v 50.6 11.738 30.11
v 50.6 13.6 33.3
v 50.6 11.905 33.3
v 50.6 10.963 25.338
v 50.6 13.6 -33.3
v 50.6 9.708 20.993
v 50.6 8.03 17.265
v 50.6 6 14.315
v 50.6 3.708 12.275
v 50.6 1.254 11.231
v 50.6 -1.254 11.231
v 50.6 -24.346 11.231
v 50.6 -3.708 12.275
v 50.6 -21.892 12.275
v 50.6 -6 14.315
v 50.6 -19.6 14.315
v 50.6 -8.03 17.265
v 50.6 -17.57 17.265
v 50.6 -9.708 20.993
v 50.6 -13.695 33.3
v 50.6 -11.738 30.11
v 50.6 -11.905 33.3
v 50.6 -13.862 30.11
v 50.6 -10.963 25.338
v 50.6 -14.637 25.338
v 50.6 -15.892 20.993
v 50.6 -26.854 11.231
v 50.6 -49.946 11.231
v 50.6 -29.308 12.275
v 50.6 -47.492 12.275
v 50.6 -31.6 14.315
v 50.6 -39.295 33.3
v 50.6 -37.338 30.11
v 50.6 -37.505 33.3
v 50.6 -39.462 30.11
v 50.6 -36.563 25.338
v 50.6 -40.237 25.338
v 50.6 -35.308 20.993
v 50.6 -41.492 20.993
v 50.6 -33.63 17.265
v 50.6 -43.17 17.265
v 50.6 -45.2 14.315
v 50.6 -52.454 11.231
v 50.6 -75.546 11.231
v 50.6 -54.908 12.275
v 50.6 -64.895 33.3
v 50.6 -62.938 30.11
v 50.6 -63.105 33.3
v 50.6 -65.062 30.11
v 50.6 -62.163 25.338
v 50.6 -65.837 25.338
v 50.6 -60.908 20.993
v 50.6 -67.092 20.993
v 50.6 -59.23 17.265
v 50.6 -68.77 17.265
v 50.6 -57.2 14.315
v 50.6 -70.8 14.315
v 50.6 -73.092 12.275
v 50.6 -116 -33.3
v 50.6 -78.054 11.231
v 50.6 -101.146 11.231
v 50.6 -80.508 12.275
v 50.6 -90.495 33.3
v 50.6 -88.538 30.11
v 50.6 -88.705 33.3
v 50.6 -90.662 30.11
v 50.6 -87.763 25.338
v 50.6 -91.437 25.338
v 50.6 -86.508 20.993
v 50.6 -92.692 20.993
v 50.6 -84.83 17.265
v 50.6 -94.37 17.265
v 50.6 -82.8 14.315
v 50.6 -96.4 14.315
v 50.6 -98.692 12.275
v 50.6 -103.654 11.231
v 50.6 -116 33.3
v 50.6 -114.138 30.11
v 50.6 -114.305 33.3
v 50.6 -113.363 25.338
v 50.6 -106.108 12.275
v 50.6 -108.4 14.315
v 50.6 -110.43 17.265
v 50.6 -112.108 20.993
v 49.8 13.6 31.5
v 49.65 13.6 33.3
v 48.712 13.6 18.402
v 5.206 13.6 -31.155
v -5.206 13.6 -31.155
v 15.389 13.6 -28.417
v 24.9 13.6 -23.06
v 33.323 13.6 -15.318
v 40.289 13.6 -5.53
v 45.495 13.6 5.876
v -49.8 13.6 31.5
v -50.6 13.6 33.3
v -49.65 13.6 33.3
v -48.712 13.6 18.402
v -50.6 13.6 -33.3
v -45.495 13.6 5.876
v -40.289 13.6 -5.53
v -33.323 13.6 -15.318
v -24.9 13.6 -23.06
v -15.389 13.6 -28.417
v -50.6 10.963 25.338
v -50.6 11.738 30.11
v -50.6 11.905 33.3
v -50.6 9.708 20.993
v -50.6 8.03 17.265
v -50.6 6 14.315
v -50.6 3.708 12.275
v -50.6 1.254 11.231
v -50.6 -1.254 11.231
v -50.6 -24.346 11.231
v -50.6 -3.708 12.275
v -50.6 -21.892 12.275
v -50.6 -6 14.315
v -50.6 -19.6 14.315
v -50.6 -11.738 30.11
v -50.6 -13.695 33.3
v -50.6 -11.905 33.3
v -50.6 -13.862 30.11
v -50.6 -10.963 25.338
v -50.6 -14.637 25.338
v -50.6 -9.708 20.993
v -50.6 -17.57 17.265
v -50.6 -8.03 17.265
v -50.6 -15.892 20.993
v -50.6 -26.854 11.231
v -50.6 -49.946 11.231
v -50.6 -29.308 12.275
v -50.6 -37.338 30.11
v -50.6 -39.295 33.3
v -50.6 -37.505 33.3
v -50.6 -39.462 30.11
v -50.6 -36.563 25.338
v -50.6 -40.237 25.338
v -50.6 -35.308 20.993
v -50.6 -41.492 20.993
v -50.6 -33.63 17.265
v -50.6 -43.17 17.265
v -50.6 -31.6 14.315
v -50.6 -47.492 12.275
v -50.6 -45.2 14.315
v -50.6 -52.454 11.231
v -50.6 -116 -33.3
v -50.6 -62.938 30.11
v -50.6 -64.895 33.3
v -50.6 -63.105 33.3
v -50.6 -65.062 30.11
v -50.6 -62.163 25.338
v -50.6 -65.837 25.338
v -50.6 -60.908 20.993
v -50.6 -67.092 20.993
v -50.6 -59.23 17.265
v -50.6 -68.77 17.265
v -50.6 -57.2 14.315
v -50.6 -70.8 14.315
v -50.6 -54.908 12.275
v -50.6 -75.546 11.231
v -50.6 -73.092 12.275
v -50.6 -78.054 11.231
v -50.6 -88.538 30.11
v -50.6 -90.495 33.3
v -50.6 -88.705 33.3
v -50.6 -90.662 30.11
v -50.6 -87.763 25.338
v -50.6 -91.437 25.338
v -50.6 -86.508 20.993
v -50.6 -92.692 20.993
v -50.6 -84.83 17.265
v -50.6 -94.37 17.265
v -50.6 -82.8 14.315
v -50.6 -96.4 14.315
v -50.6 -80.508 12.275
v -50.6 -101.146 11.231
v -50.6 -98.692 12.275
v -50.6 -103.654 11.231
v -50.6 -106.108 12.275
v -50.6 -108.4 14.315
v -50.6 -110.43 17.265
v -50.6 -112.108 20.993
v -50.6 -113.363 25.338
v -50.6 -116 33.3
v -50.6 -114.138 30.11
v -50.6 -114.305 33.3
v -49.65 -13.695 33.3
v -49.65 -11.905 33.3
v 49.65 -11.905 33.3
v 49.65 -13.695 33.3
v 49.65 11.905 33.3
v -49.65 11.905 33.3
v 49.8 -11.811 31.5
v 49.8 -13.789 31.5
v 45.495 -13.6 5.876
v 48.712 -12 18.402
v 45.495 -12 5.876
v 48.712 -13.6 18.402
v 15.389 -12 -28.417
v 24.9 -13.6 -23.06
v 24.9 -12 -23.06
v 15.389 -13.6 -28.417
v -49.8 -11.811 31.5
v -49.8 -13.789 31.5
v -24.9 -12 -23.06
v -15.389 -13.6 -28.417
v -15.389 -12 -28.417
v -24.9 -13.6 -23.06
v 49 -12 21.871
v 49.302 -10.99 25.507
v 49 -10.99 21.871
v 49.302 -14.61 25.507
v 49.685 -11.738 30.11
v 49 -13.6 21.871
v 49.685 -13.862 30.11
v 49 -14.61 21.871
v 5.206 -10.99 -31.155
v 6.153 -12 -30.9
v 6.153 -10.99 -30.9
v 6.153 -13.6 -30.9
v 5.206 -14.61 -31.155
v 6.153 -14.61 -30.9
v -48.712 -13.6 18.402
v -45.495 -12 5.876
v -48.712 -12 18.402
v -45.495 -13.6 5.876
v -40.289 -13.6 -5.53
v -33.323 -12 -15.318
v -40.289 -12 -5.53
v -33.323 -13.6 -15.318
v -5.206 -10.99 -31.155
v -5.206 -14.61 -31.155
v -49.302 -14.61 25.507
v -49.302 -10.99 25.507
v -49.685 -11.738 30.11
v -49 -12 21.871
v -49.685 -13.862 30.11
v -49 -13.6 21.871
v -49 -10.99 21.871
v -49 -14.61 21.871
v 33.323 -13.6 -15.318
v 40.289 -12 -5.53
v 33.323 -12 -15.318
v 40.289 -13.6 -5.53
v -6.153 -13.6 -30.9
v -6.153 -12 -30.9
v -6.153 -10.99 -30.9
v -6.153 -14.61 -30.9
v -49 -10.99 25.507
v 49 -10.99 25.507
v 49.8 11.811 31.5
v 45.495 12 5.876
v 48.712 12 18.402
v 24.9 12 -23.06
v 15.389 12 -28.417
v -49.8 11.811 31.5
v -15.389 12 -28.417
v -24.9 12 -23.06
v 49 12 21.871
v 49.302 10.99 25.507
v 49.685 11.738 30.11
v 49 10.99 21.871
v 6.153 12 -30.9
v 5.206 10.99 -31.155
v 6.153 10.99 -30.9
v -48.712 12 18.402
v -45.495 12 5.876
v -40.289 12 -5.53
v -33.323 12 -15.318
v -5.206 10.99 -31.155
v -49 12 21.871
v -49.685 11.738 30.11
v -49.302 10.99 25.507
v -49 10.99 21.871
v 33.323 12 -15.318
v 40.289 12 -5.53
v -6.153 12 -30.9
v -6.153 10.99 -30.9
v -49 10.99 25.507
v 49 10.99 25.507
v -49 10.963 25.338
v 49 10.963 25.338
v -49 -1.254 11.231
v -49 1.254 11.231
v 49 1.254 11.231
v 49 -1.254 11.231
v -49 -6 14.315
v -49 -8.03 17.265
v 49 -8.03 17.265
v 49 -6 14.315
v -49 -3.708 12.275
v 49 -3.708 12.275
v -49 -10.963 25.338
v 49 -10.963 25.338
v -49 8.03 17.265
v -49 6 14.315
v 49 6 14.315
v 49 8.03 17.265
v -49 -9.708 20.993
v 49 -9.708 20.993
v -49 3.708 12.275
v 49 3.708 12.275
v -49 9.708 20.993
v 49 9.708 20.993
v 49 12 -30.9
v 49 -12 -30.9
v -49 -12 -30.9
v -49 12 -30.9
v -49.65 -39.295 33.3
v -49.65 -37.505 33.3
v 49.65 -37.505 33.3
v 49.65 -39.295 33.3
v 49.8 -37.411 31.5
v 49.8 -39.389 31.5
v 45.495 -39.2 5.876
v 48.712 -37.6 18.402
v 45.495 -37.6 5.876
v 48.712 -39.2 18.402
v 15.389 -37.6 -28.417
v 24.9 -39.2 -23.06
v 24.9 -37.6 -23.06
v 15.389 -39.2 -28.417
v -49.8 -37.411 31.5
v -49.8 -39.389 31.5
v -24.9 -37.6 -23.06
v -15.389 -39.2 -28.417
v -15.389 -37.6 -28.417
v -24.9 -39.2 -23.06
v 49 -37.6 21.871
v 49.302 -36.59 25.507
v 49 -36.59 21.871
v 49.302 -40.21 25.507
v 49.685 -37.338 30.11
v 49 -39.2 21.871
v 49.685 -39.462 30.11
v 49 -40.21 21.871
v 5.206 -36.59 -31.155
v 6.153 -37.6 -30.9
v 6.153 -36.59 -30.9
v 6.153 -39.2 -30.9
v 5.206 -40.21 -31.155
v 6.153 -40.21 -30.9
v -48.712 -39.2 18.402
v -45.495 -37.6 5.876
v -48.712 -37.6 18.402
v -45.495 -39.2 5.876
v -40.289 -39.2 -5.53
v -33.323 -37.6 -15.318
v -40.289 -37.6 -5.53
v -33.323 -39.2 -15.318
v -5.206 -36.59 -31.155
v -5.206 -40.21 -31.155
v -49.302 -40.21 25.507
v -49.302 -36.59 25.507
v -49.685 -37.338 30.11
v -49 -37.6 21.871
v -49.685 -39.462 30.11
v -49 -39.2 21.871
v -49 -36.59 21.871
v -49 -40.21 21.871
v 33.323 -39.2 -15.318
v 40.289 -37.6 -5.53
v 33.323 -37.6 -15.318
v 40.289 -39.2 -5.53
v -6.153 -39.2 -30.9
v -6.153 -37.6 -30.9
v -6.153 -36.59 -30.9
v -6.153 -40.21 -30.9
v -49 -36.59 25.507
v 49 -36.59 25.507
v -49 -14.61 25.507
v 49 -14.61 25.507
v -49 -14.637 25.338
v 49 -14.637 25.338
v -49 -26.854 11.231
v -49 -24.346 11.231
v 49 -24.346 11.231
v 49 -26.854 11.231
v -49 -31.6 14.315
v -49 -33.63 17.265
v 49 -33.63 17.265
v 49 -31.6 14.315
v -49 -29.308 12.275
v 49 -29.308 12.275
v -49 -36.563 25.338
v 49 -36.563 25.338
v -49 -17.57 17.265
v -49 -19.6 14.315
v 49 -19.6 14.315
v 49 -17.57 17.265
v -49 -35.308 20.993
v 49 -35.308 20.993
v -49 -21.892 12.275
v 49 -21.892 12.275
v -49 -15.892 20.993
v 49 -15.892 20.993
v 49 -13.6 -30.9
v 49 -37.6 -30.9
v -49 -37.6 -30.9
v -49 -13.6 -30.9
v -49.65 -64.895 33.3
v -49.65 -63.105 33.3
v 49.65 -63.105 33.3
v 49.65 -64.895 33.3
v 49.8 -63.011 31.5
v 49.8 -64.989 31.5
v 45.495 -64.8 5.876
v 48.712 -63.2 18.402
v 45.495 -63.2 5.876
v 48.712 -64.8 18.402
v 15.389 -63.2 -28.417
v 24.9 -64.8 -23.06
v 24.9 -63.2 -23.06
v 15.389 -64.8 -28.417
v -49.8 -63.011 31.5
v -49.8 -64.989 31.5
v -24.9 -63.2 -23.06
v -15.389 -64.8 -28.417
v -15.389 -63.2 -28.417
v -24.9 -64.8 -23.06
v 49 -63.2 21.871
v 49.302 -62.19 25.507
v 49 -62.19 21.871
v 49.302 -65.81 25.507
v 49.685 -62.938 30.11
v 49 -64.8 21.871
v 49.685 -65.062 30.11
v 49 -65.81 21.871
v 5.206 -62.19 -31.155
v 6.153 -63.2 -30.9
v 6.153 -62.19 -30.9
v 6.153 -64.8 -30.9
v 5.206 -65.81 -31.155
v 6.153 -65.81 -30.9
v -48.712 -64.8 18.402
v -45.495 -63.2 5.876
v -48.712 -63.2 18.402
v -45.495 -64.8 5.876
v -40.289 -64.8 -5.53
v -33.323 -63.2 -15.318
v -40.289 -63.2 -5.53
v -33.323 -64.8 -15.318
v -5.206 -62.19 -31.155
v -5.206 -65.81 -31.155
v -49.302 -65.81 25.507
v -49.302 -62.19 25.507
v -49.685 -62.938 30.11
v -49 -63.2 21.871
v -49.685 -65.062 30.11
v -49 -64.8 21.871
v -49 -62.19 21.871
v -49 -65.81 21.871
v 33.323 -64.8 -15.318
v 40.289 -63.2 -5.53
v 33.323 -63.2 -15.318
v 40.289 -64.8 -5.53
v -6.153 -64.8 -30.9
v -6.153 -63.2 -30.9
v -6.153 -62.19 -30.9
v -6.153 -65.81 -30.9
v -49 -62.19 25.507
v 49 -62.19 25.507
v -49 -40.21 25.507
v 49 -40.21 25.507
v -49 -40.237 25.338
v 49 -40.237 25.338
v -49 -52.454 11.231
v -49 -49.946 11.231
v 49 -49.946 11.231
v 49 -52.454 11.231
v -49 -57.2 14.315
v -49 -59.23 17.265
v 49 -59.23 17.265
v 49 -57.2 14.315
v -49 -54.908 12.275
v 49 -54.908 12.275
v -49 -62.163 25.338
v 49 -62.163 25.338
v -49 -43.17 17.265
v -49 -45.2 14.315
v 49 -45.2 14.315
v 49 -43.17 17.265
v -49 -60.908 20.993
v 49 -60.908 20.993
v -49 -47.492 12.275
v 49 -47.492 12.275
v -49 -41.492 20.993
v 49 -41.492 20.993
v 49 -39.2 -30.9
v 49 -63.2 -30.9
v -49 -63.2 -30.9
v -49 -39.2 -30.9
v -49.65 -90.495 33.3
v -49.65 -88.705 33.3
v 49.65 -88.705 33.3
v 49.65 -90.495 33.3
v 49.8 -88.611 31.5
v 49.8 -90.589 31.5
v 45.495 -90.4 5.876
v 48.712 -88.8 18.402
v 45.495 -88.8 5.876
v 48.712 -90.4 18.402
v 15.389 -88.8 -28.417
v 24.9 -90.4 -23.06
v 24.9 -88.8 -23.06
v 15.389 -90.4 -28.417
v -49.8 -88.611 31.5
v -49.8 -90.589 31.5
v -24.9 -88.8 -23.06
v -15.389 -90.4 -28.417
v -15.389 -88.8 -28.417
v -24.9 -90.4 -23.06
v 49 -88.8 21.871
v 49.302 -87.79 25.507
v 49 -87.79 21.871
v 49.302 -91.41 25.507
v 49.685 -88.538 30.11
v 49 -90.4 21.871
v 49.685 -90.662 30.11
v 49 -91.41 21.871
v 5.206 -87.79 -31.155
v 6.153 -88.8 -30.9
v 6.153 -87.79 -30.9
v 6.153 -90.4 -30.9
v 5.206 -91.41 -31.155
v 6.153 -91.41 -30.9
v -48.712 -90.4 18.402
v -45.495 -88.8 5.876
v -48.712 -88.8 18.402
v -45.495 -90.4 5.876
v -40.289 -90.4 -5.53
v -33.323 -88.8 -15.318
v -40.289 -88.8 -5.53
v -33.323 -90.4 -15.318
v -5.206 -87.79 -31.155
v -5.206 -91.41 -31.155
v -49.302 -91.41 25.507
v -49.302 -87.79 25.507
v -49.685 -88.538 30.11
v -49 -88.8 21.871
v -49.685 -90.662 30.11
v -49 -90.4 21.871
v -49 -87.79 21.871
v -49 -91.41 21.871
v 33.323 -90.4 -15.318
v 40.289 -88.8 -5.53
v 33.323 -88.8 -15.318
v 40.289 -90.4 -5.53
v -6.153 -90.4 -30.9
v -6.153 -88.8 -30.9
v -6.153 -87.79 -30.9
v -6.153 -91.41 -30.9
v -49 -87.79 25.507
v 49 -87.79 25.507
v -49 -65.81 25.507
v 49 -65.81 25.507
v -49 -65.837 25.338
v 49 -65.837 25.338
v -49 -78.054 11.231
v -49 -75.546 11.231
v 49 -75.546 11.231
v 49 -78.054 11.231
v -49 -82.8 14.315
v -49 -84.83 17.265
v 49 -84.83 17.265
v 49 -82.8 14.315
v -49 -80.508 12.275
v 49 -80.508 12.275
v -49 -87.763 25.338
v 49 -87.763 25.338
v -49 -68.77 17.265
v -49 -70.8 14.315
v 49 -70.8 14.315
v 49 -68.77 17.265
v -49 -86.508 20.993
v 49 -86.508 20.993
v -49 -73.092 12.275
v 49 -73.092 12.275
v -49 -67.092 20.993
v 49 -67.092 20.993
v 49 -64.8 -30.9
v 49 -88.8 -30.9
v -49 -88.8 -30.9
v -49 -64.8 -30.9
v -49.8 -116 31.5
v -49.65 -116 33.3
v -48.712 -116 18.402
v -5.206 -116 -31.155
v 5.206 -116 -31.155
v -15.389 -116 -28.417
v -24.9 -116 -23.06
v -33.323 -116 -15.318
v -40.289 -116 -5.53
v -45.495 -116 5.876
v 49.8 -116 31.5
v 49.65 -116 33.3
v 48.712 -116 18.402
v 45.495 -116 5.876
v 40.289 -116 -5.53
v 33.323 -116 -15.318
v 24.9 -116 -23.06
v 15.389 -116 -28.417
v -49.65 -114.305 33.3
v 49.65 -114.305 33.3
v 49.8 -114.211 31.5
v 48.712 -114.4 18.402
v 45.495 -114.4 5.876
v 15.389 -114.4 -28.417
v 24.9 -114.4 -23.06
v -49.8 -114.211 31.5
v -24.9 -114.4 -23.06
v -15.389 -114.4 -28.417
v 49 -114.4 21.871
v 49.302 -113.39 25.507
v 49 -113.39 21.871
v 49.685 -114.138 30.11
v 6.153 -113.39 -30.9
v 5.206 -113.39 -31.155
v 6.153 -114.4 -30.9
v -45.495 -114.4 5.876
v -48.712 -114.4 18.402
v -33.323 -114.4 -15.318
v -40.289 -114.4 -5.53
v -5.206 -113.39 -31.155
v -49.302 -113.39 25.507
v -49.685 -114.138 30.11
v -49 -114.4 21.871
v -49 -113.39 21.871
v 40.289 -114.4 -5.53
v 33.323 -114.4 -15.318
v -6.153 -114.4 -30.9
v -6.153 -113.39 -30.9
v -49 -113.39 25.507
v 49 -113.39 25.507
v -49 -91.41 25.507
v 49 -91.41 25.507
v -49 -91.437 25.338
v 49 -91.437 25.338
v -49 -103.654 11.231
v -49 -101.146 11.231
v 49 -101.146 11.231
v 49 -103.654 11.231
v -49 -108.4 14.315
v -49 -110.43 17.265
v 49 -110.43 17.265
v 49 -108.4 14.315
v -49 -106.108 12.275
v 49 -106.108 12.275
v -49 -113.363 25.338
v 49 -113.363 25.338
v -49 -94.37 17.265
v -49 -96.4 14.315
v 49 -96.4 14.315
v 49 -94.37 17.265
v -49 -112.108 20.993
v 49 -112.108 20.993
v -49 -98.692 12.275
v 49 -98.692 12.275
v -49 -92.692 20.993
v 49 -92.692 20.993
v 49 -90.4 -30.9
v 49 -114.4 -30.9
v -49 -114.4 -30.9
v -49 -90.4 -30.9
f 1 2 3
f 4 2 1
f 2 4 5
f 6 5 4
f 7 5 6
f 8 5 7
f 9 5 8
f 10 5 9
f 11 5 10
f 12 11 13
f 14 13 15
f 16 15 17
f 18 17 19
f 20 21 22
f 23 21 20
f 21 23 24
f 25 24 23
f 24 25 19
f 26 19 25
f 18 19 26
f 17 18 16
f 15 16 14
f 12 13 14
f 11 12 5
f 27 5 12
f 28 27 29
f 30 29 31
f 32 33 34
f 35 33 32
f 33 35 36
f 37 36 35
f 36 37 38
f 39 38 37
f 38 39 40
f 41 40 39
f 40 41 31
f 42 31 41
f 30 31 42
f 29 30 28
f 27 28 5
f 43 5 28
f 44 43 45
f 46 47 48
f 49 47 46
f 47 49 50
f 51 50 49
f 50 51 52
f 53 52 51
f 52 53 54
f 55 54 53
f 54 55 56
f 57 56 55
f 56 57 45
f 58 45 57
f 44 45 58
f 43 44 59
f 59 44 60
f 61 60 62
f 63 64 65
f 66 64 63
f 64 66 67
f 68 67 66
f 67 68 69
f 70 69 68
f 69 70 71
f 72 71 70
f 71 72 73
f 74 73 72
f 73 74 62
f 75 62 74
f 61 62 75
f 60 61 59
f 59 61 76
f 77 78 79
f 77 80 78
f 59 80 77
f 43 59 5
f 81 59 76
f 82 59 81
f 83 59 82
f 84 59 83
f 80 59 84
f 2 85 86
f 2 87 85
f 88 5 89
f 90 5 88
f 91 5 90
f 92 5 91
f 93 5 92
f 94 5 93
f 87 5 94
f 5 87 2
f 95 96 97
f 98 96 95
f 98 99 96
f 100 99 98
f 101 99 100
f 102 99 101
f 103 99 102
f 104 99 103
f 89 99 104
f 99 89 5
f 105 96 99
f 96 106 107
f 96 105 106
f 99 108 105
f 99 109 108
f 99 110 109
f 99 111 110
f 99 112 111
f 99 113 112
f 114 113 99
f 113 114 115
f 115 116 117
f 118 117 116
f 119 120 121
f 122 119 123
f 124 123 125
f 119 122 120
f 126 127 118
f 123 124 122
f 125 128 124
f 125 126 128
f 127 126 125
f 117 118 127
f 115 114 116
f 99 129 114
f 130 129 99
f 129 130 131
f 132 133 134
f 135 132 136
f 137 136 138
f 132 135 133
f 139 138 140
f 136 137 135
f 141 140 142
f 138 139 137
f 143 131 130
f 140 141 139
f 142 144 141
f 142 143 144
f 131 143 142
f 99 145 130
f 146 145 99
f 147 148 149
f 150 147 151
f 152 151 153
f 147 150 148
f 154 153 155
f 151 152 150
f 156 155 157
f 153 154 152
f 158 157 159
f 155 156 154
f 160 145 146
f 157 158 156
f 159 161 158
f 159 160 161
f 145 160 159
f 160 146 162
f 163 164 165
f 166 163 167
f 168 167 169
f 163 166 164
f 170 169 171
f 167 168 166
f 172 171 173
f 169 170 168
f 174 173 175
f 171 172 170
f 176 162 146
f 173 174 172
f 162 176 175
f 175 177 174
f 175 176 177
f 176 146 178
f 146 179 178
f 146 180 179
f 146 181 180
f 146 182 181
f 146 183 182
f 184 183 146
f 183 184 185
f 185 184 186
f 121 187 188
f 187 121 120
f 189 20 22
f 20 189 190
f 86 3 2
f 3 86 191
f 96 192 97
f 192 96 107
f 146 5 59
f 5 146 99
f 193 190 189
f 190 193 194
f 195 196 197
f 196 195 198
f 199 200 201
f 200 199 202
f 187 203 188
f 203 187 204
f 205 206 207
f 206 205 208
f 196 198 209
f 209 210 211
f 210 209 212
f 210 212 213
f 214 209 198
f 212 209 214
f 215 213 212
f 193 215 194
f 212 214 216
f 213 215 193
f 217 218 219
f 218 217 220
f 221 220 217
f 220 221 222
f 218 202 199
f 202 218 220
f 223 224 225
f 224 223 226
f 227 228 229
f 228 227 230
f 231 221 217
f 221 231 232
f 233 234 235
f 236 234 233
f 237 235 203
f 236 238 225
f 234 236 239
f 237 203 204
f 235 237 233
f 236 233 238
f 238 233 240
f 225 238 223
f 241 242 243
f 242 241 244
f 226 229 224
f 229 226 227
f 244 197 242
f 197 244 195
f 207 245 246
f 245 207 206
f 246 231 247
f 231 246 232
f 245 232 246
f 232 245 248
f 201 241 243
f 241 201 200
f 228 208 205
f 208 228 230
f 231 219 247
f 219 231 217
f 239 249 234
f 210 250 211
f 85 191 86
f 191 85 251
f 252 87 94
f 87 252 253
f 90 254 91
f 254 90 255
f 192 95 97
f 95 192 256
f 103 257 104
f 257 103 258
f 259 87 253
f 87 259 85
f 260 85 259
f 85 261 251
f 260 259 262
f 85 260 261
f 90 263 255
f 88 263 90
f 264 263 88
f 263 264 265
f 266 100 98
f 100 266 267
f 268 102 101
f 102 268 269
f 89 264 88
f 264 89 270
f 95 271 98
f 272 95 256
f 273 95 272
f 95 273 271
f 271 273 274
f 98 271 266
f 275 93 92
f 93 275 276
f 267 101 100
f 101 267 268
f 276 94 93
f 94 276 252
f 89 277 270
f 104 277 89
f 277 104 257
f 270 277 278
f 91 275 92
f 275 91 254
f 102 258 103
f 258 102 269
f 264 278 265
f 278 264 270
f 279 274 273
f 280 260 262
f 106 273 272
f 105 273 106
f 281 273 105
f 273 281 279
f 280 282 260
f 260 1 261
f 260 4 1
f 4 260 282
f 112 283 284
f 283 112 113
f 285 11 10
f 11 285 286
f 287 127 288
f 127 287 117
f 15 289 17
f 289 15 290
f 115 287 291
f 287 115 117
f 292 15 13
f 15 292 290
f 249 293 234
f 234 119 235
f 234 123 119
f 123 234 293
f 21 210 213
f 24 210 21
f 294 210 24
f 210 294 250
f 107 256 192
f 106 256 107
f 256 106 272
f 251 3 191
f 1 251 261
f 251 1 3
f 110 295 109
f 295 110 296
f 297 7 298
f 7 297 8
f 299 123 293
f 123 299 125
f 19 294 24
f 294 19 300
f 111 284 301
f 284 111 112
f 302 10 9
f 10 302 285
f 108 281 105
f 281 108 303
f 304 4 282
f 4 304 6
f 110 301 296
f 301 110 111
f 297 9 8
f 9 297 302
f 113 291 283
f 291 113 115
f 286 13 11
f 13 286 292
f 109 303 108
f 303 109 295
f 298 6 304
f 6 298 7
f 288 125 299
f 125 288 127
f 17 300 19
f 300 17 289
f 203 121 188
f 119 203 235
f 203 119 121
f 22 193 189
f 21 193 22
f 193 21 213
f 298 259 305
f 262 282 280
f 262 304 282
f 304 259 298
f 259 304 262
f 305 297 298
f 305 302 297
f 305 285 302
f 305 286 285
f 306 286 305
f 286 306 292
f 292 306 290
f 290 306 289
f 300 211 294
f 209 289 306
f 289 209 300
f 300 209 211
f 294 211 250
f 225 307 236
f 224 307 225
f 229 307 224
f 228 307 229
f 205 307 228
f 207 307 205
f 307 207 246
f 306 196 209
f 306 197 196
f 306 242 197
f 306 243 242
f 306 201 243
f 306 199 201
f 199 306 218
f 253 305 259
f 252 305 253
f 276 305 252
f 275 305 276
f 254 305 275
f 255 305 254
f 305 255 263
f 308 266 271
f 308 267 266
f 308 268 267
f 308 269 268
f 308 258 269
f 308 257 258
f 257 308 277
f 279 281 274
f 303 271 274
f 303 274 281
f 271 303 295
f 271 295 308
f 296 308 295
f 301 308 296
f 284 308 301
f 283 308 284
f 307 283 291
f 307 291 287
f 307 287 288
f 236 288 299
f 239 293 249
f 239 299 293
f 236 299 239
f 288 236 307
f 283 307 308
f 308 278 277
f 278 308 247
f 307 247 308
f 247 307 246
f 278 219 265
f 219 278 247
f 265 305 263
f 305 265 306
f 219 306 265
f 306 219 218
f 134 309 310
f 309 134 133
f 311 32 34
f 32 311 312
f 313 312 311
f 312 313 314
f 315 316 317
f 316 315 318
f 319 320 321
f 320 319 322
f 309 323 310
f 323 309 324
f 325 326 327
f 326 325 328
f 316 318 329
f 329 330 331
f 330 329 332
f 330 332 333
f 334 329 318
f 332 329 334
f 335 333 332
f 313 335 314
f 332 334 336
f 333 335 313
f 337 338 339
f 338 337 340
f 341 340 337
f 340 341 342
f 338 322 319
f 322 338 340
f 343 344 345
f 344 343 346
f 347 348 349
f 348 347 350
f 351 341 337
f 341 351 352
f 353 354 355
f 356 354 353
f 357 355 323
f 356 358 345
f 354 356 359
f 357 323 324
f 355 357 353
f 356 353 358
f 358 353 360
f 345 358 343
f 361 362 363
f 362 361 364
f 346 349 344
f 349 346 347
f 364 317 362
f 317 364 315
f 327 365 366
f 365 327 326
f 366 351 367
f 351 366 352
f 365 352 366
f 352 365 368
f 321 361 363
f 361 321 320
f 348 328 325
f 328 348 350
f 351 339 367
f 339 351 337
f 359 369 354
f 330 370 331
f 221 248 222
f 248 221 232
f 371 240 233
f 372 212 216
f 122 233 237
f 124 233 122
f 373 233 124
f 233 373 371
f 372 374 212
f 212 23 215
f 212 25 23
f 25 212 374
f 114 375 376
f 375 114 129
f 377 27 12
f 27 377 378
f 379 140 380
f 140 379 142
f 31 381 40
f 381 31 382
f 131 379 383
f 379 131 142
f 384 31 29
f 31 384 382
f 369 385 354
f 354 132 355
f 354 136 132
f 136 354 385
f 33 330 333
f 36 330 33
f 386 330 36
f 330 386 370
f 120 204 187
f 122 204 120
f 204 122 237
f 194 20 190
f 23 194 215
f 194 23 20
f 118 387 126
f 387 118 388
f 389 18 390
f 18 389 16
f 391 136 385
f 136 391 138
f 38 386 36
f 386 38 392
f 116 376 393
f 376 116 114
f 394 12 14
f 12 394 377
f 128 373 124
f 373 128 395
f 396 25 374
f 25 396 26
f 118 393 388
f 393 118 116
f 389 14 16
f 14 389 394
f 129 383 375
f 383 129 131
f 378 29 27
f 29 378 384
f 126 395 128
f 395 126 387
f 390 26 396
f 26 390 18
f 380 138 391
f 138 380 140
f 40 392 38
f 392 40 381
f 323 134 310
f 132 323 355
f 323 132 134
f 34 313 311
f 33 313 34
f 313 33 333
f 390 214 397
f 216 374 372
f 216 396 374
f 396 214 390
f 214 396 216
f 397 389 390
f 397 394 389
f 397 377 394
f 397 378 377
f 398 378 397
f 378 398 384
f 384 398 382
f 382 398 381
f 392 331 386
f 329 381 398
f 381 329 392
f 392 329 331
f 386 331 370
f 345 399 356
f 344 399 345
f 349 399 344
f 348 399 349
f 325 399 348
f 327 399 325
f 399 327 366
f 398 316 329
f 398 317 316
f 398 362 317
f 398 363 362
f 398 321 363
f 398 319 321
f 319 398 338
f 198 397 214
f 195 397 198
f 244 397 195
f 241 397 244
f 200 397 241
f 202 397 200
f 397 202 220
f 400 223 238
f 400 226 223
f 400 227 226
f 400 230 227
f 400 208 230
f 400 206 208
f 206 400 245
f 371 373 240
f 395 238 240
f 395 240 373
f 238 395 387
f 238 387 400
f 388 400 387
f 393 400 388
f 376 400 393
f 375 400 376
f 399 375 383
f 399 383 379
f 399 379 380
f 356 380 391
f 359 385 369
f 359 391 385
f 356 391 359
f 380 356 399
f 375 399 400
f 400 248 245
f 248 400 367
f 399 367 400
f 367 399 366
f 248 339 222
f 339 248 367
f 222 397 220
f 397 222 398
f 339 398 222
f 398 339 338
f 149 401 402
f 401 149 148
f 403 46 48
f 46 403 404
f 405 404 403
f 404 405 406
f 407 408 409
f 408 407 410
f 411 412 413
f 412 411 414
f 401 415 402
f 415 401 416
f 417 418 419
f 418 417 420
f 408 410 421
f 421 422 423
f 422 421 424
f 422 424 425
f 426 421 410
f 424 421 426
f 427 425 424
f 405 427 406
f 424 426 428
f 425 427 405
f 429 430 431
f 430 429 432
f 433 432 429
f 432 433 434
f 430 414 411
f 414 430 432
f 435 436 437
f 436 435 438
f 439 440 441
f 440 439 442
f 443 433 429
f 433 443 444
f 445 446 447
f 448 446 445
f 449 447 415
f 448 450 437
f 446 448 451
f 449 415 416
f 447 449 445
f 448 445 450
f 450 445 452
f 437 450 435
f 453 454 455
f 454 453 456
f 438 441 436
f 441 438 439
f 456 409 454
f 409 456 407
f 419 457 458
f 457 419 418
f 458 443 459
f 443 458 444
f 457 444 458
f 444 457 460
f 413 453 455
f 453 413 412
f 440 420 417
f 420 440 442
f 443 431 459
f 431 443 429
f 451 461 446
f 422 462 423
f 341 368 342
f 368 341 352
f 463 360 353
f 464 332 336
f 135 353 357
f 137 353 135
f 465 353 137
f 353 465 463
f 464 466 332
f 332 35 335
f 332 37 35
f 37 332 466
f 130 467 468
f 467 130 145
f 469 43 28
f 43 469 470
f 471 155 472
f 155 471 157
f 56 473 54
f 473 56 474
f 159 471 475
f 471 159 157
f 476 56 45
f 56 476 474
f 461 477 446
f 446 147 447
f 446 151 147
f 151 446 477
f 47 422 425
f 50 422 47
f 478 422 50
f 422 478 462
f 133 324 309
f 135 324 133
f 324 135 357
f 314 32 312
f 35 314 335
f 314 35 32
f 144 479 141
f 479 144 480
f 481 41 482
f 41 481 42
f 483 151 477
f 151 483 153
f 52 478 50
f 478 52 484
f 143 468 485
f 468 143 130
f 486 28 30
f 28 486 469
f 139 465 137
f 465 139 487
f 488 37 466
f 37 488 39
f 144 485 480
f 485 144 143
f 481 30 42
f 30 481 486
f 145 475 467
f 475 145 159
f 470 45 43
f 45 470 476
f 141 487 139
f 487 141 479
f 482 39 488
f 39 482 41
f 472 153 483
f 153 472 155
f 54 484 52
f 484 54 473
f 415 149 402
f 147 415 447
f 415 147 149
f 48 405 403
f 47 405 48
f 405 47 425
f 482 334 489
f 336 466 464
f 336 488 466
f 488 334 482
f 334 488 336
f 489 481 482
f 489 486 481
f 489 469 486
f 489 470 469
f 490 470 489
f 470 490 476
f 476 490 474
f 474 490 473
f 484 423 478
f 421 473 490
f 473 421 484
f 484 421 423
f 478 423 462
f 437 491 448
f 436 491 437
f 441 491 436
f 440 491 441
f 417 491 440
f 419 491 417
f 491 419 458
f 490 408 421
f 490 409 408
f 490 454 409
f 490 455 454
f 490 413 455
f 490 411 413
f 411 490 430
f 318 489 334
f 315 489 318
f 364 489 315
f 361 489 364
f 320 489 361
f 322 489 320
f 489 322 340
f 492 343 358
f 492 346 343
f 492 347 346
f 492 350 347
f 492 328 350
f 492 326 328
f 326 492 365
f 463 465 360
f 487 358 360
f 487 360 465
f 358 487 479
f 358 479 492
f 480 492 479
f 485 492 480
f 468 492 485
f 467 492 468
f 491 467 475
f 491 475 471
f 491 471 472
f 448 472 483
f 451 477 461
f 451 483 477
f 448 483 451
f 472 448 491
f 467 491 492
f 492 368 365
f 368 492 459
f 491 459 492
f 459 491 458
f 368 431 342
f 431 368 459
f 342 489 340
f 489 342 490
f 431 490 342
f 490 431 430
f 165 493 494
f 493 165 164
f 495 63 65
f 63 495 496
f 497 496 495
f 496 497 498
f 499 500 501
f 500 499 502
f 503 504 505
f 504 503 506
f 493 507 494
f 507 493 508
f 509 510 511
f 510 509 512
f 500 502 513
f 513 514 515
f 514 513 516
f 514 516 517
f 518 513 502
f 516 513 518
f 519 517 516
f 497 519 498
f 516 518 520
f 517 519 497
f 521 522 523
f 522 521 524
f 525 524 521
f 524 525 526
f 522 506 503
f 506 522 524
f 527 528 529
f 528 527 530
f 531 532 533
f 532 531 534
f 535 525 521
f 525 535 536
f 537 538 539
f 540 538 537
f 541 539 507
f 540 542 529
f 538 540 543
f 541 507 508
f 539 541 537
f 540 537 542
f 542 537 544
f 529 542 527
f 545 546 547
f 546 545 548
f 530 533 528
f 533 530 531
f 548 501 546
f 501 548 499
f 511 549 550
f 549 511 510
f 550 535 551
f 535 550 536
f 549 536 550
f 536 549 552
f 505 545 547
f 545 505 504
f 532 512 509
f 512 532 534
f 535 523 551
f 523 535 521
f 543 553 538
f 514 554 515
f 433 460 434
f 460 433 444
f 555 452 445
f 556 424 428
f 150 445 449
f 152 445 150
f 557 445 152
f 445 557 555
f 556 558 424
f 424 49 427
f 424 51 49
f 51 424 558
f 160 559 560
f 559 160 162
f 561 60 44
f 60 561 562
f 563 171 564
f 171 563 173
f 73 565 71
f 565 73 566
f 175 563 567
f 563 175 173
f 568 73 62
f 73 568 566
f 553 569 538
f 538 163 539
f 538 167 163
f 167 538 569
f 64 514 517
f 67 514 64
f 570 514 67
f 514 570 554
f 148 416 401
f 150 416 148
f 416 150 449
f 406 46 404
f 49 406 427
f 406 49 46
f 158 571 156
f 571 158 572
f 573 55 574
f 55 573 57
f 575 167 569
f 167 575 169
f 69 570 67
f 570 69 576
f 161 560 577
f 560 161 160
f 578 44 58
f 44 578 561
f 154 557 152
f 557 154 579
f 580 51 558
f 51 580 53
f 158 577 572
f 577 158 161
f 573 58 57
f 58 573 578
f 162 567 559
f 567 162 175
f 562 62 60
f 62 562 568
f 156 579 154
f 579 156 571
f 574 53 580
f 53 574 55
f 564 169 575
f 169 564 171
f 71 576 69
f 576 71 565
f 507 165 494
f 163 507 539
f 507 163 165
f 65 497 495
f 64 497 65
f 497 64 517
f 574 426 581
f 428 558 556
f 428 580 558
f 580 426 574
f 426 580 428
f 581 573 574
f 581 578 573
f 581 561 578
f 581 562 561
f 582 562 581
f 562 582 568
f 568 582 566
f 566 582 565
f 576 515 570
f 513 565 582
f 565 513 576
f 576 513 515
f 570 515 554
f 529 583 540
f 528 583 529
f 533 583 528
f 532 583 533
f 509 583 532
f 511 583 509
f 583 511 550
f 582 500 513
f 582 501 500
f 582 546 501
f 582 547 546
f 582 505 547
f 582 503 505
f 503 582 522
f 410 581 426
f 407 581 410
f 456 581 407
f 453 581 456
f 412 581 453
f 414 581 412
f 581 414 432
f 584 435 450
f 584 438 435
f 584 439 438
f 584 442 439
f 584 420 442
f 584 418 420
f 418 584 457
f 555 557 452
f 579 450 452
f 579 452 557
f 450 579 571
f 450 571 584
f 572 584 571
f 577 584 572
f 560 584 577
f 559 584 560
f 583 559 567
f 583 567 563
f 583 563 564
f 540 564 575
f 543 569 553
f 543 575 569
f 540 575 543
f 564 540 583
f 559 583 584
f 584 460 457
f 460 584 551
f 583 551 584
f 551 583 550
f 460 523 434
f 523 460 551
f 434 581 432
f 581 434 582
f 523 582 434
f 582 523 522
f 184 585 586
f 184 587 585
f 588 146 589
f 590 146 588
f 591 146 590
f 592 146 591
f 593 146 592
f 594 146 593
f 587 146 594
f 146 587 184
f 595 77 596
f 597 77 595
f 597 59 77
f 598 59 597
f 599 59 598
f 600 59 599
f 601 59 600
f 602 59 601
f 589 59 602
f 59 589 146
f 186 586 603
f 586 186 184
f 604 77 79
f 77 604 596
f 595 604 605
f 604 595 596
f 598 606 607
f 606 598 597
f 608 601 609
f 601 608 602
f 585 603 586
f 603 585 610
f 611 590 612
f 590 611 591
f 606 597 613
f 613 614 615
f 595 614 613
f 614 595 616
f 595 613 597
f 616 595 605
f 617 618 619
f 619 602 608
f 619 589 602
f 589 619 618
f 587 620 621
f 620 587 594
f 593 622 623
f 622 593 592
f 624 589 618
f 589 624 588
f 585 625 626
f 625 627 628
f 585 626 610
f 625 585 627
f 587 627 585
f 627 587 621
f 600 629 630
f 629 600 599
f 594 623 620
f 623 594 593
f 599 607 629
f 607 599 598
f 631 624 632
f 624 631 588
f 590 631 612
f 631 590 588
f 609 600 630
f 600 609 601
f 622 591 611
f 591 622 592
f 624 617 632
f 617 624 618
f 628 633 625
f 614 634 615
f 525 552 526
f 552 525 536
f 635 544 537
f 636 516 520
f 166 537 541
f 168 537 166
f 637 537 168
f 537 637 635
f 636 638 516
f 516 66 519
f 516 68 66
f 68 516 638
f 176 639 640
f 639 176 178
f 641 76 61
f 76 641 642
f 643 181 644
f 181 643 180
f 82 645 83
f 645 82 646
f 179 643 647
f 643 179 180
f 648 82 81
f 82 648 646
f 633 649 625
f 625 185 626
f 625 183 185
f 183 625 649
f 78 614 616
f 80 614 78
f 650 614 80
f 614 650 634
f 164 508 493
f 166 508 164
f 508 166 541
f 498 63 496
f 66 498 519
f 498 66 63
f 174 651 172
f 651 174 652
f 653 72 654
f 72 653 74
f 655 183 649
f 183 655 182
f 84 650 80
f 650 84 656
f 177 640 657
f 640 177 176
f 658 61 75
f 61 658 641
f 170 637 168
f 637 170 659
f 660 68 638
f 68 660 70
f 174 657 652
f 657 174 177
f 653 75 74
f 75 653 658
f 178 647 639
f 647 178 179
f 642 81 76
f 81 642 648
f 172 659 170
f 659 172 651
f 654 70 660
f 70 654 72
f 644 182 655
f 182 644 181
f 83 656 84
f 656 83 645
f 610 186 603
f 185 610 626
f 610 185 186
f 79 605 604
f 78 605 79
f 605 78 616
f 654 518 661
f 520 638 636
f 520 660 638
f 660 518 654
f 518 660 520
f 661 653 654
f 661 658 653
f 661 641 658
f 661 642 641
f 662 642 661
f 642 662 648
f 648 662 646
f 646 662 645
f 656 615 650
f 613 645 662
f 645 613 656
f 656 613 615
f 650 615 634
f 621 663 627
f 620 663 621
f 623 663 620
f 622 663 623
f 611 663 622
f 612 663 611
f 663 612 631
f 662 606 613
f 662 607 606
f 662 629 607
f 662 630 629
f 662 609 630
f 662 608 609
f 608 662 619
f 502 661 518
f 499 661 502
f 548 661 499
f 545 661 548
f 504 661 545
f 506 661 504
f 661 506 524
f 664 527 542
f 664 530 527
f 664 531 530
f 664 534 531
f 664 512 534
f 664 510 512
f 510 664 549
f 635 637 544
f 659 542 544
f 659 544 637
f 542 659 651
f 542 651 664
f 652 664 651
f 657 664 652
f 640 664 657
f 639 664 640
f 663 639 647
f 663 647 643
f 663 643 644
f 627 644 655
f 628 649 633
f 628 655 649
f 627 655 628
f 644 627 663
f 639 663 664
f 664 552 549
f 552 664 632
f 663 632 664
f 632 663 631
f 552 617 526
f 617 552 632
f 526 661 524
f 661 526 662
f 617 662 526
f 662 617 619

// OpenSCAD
/**
 * Inspired by the Altoids tin caddy here:
 * https://www.thingiverse.com/thing:67893
 *
 * I felt this used too much material for my tastes. Everything prints solid
 * with two layers for walls, and I figured the shelves were a little too
 * "complete". At time of writing, it's a $5-6 print. I felt there were savings
 * to made in the shelving areas themselves. This new design clocks in closer to
 * $2 to print.
 */

// Width and depth account for lip around the container. All measurements
// rounded to the highest millimeter.
altoidSize = [96.0, 63.0, 22.0];
containers = 5;
toleranceFactor = 1.05;
toleranceAdd = 2;
wallThickness = 0.4 * 4;
zPeace = 0.01;

module tin() {
  cube(altoidSize, center=true);
}

/**
 * The difference doesn't work with a resize, so just apply the resize in-place.
 */
module tinDifference() {
  cube([
    altoidSize.x + toleranceAdd,
    altoidSize.y + toleranceAdd,
    altoidSize.z + toleranceAdd,
  ], center=true);
}

// The gap along the sides which makes it easy to grip.
module gripGap() {
  rotate(a=90, v=[0, 1, 0])
    // Give us extra grip space.
    scale([1, 2, 1])
    cylinder(
      d=altoidSize.z + toleranceAdd,
      h=altoidSize.x + toleranceAdd + wallThickness * 2 + zPeace,
      center = true
    );
}

// The gap on the bottom and top of the shelf - purely for saving material cost.
module shelfGap() {
  resize(newsize=[altoidSize.x + toleranceAdd + wallThickness, 0, 0])
    cylinder(
      d=altoidSize.y * 2,
      h = wallThickness * 2,
      center = true
    );
}

module enclosureBase() {
  cube([
    altoidSize.x + toleranceAdd + wallThickness * 2,
    altoidSize.y + toleranceAdd + wallThickness,
    altoidSize.z + toleranceAdd + wallThickness * 2,
  ], center=true);
}

module enclosure() {
  difference() {
    enclosureBase();
    translate([
      0,
      altoidSize.y / 2,
      altoidSize.z / 2 + wallThickness - zPeace,
    ])
      shelfGap();
    translate([
      0,
      altoidSize.y / 2,
      -(altoidSize.z / 2 + wallThickness - zPeace),
    ])
      shelfGap();
    translate([0, wallThickness + altoidSize.y / 2 + toleranceAdd, 0])
      gripGap();
    translate([0, wallThickness, 0])
      tinDifference();
  }
}

// Lay it on its back for printing.
module caddy() {
  rotate(a=90, v=[1, 0, 0]) {
    for(i=[0:containers - 1]) {
      translate([0, 0, i * (altoidSize.z + toleranceAdd + wallThickness)])
        enclosure();
    }
  }
}

caddy();

// Use to debug:
/* enclosure(); */
